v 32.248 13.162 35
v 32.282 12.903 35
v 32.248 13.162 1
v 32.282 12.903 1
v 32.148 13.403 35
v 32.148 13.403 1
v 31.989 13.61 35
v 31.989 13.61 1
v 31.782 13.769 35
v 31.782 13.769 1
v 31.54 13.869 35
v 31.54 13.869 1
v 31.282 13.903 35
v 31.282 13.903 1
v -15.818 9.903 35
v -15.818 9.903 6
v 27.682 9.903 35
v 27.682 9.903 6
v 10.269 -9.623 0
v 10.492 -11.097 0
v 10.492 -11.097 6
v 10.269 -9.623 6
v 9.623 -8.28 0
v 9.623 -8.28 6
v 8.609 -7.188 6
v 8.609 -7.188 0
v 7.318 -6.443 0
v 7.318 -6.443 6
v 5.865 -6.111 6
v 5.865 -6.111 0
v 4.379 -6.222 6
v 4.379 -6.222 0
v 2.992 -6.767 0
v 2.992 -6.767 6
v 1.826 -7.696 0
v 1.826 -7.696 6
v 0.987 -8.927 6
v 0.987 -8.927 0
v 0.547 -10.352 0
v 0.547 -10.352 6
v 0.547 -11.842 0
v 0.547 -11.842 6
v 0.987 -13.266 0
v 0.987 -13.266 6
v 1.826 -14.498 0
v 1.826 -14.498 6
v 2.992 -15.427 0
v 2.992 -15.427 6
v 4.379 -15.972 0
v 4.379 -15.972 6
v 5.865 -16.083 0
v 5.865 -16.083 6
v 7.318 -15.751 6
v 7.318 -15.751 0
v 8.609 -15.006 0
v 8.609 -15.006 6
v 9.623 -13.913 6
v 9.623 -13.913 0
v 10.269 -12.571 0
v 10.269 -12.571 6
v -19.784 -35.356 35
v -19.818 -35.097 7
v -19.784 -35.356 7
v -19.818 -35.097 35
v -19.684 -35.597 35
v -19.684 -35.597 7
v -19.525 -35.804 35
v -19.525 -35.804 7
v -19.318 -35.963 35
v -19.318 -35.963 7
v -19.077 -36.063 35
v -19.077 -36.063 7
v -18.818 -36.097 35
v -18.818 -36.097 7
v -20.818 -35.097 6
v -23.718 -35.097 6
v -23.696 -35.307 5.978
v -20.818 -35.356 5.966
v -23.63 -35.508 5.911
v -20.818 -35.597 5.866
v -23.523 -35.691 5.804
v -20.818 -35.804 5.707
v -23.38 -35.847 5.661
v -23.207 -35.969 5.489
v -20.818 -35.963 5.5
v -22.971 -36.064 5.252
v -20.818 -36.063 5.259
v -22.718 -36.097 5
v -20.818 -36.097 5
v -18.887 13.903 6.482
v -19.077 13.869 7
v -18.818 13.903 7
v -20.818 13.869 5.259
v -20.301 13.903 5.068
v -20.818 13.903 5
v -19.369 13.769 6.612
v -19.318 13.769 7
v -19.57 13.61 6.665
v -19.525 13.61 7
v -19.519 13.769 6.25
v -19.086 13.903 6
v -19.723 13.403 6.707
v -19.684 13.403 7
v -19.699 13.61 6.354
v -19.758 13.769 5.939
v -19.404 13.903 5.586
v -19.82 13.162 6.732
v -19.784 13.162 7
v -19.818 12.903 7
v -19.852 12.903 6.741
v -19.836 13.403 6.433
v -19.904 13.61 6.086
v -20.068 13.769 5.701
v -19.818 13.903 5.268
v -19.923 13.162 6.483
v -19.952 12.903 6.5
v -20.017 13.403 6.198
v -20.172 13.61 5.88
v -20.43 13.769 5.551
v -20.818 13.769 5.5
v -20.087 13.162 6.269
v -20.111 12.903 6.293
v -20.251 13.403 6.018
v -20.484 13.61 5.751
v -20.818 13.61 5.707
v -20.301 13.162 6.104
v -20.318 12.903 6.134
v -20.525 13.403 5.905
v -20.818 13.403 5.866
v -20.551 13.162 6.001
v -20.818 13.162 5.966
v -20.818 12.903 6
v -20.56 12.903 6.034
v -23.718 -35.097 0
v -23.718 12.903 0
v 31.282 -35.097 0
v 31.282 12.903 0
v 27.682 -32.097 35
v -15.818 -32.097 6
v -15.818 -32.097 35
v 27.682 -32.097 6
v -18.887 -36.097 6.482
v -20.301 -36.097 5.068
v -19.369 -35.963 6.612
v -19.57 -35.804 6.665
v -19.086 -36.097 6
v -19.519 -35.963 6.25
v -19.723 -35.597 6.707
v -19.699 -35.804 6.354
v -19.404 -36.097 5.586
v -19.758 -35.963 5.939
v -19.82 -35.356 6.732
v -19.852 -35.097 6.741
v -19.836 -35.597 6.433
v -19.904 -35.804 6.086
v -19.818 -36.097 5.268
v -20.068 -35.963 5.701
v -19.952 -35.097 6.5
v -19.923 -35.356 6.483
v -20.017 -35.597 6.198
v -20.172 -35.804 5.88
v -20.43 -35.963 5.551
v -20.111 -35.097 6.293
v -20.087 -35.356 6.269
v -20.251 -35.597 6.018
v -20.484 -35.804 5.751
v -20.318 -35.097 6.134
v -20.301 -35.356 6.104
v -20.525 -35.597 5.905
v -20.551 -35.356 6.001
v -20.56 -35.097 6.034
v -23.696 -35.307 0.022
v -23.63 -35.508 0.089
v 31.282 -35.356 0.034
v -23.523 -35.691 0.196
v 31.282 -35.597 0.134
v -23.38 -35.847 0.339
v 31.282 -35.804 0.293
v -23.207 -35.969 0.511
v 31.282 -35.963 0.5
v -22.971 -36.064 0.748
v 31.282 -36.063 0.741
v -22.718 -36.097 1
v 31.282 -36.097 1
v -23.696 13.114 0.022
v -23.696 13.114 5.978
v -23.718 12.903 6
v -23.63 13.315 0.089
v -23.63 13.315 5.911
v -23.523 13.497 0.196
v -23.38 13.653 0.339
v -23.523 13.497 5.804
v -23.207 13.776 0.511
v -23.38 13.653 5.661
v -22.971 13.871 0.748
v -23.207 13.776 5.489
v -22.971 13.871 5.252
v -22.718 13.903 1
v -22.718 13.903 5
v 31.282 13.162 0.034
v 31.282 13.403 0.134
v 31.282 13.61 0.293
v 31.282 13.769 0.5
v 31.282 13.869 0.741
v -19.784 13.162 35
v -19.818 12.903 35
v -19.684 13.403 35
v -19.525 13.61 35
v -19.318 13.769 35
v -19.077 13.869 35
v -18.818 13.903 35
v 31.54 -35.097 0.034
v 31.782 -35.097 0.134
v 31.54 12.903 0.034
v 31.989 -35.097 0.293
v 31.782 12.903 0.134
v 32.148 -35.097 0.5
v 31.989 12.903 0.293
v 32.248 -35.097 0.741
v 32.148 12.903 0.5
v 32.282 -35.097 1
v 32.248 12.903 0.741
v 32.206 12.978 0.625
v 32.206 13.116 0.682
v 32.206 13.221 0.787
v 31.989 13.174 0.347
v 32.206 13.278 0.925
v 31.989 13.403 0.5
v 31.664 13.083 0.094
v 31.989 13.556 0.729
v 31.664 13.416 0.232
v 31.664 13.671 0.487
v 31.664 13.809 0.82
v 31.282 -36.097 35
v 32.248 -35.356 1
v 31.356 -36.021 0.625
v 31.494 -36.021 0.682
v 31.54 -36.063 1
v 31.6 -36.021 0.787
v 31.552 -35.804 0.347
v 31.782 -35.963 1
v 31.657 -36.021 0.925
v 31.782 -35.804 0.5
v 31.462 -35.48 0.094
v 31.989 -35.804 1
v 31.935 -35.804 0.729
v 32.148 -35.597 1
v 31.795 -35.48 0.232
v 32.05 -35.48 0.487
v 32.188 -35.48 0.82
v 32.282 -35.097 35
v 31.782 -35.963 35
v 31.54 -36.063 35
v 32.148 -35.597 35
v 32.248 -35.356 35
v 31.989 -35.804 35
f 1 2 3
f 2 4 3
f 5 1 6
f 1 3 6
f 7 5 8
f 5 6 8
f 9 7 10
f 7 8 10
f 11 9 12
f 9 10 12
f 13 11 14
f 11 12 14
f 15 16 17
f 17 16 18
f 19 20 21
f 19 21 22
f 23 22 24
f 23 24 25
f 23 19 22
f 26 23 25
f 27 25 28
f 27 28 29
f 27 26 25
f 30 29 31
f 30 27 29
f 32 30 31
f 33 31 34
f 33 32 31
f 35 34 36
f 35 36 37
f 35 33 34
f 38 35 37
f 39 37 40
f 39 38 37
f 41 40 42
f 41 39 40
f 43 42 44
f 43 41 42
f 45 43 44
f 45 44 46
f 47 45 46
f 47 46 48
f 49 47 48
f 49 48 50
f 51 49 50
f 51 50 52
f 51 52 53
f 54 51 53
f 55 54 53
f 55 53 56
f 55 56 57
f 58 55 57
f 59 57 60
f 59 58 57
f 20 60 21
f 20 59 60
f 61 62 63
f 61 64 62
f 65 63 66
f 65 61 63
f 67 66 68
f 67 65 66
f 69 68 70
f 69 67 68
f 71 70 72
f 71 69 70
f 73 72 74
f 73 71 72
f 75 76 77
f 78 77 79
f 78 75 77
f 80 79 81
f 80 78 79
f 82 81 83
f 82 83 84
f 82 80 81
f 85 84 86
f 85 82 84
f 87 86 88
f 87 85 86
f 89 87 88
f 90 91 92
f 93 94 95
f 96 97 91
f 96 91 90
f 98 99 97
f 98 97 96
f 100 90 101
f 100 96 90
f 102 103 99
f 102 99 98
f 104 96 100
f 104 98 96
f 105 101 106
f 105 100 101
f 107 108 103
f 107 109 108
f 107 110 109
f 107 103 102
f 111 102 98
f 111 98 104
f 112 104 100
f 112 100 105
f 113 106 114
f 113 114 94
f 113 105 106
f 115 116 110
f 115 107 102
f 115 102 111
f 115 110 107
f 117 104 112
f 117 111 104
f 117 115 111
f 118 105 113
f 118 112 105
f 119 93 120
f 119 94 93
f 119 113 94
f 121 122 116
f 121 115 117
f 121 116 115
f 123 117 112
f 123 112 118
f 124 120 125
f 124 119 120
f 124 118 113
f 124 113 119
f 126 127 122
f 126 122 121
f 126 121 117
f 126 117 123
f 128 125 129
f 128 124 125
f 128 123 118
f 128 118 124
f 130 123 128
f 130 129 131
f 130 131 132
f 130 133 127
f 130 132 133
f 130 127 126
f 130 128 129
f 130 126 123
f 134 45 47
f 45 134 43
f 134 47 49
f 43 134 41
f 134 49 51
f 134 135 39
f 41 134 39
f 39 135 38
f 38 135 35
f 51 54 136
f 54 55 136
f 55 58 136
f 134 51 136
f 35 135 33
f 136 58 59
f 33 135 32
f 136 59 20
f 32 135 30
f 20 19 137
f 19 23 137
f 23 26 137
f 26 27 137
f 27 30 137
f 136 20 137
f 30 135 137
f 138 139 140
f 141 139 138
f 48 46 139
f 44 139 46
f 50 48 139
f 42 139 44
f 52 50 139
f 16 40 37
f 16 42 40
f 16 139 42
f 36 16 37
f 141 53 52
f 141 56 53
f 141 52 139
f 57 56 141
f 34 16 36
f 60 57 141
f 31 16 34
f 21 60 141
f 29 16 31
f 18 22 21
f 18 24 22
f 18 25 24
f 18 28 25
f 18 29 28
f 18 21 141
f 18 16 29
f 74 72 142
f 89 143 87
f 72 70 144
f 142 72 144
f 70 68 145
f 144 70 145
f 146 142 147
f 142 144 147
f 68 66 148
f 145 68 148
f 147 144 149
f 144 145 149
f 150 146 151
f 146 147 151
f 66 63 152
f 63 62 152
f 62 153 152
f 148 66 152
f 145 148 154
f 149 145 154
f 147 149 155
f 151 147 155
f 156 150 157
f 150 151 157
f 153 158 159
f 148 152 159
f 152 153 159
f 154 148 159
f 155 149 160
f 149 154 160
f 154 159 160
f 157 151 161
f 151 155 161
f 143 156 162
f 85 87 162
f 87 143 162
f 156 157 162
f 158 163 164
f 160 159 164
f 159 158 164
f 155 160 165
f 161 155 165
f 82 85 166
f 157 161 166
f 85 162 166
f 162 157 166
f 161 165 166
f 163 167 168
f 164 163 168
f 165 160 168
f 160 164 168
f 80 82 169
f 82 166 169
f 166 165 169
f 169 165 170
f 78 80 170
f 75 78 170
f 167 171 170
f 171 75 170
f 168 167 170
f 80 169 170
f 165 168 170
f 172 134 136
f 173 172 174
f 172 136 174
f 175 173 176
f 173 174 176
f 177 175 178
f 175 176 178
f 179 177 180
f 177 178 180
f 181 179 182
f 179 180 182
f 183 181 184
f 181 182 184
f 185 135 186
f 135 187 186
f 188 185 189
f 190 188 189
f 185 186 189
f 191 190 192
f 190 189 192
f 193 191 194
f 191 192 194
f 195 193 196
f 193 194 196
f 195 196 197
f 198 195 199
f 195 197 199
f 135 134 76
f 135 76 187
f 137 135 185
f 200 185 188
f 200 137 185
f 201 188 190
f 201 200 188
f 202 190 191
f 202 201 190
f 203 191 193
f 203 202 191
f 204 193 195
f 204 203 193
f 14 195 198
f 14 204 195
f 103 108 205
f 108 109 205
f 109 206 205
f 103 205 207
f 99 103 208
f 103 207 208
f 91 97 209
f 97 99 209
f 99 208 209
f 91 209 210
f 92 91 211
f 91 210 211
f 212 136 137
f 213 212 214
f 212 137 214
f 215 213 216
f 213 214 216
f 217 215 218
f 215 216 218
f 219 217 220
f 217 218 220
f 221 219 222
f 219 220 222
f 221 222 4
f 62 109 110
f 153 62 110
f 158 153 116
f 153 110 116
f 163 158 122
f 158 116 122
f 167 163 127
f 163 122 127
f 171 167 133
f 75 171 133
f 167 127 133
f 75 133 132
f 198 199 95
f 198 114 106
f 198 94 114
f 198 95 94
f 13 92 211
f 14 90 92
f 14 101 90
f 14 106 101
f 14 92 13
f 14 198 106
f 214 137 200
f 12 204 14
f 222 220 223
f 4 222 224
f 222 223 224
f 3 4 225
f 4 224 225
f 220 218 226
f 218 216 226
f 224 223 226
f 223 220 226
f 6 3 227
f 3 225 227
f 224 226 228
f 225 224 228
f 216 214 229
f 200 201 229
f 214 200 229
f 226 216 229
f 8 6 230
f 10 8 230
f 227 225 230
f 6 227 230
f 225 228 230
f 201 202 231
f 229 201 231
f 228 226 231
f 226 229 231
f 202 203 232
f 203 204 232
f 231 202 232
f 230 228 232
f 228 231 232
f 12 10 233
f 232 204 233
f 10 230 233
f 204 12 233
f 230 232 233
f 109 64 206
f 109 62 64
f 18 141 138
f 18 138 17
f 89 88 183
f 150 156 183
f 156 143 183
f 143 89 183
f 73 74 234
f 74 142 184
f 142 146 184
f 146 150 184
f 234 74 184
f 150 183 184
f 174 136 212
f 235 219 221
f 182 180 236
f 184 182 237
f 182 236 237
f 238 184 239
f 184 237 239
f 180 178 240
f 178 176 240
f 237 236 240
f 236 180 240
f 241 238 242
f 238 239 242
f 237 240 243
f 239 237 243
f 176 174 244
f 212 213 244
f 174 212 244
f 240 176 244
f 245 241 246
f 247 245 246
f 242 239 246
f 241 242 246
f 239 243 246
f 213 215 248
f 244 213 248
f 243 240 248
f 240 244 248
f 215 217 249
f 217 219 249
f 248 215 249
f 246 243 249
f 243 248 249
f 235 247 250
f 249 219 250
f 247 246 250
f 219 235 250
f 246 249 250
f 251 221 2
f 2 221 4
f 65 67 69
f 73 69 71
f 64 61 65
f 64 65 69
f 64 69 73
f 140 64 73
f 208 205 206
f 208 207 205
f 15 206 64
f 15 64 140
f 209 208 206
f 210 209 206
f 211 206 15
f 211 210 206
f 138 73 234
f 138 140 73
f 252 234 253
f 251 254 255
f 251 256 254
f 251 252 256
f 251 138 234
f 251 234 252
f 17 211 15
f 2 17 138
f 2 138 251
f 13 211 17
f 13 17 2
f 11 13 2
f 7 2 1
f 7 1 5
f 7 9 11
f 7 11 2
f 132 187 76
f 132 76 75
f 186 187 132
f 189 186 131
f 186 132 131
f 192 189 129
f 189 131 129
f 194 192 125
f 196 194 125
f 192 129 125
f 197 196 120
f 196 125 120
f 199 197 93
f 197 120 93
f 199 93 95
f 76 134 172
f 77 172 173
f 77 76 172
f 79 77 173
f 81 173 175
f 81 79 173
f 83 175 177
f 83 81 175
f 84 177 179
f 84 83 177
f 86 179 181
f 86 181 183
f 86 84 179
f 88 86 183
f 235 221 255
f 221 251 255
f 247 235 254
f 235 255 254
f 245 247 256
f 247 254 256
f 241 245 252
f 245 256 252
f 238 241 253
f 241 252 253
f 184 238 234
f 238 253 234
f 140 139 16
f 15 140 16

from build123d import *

# Parameters (mm, degrees)
ESBO_O1_W                = 56
ESBO_O1_H                = 50
ESBO_O1_R                = 5
RESSALTO_EXTRUS_O1_DEPTH = 6
ESBO_O2_W                = 52.1
ESBO_O2_H                = 50
ESBO_O2_W_2              = 43.5
ESBO_O2_H_2              = 42
RESSALTO_EXTRUS_O2_DEPTH = 29
FILETE1_R                = 1


with BuildPart() as part:
    # Esboço1 → Ressalto-extrusão1 (new body)
    with BuildSketch(Plane.XY):
        with Locations((4.281632844, -11.096885813)):
            Rectangle(ESBO_O1_W, ESBO_O1_H)
        with Locations((5.491632844, -11.096885813)):
            Circle(ESBO_O1_R, mode=Mode.SUBTRACT)
    extrude(amount=RESSALTO_EXTRUS_O1_DEPTH)

    # Esboço2 → Ressalto-extrusão2 (add)
    with BuildSketch(Plane.XY.offset(6)):
        with Locations((6.231632844, -11.096885813)):
            Rectangle(ESBO_O2_W, ESBO_O2_H)
        with Locations((5.931632844, -11.096885813)):
            Rectangle(ESBO_O2_W_2, ESBO_O2_H_2, mode=Mode.SUBTRACT)
    extrude(amount=RESSALTO_EXTRUS_O2_DEPTH)

    # Filete1
    filete1_edges = [part.edges().sort_by_distance(p)[0] for p in [
        (-21.768367156, 13.903114187, 6),
        (-19.818367156, -11.096885813, 6),
        (-19.818367156, 13.903114187, 20.5),
        (-19.818367156, -36.096885813, 20.5),
        (4.281632844, 13.903114187, 0),
        (32.281632844, -11.096885813, 0),
        (4.281632844, -36.096885813, 0),
        (-23.718367156, 13.903114187, 3),
        (32.281632844, 13.903114187, 17.5),
        (32.281632844, -36.096885813, 17.5),
        (-23.718367156, -36.096885813, 3),
        (-21.768367156, -36.096885813, 6),
    ]]
    fillet(filete1_edges, radius=FILETE1_R)


solid = part.part
